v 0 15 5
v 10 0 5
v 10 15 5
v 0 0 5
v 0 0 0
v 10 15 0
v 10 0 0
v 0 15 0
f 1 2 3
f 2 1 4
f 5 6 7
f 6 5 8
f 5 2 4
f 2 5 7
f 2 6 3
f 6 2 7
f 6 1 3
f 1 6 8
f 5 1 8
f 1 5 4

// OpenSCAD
// [ cube ]
// size: Größe (Vektor)
// center: auf 0-Punkt zentriert (Bool)
cube(size = [10,15,5], center = false);
